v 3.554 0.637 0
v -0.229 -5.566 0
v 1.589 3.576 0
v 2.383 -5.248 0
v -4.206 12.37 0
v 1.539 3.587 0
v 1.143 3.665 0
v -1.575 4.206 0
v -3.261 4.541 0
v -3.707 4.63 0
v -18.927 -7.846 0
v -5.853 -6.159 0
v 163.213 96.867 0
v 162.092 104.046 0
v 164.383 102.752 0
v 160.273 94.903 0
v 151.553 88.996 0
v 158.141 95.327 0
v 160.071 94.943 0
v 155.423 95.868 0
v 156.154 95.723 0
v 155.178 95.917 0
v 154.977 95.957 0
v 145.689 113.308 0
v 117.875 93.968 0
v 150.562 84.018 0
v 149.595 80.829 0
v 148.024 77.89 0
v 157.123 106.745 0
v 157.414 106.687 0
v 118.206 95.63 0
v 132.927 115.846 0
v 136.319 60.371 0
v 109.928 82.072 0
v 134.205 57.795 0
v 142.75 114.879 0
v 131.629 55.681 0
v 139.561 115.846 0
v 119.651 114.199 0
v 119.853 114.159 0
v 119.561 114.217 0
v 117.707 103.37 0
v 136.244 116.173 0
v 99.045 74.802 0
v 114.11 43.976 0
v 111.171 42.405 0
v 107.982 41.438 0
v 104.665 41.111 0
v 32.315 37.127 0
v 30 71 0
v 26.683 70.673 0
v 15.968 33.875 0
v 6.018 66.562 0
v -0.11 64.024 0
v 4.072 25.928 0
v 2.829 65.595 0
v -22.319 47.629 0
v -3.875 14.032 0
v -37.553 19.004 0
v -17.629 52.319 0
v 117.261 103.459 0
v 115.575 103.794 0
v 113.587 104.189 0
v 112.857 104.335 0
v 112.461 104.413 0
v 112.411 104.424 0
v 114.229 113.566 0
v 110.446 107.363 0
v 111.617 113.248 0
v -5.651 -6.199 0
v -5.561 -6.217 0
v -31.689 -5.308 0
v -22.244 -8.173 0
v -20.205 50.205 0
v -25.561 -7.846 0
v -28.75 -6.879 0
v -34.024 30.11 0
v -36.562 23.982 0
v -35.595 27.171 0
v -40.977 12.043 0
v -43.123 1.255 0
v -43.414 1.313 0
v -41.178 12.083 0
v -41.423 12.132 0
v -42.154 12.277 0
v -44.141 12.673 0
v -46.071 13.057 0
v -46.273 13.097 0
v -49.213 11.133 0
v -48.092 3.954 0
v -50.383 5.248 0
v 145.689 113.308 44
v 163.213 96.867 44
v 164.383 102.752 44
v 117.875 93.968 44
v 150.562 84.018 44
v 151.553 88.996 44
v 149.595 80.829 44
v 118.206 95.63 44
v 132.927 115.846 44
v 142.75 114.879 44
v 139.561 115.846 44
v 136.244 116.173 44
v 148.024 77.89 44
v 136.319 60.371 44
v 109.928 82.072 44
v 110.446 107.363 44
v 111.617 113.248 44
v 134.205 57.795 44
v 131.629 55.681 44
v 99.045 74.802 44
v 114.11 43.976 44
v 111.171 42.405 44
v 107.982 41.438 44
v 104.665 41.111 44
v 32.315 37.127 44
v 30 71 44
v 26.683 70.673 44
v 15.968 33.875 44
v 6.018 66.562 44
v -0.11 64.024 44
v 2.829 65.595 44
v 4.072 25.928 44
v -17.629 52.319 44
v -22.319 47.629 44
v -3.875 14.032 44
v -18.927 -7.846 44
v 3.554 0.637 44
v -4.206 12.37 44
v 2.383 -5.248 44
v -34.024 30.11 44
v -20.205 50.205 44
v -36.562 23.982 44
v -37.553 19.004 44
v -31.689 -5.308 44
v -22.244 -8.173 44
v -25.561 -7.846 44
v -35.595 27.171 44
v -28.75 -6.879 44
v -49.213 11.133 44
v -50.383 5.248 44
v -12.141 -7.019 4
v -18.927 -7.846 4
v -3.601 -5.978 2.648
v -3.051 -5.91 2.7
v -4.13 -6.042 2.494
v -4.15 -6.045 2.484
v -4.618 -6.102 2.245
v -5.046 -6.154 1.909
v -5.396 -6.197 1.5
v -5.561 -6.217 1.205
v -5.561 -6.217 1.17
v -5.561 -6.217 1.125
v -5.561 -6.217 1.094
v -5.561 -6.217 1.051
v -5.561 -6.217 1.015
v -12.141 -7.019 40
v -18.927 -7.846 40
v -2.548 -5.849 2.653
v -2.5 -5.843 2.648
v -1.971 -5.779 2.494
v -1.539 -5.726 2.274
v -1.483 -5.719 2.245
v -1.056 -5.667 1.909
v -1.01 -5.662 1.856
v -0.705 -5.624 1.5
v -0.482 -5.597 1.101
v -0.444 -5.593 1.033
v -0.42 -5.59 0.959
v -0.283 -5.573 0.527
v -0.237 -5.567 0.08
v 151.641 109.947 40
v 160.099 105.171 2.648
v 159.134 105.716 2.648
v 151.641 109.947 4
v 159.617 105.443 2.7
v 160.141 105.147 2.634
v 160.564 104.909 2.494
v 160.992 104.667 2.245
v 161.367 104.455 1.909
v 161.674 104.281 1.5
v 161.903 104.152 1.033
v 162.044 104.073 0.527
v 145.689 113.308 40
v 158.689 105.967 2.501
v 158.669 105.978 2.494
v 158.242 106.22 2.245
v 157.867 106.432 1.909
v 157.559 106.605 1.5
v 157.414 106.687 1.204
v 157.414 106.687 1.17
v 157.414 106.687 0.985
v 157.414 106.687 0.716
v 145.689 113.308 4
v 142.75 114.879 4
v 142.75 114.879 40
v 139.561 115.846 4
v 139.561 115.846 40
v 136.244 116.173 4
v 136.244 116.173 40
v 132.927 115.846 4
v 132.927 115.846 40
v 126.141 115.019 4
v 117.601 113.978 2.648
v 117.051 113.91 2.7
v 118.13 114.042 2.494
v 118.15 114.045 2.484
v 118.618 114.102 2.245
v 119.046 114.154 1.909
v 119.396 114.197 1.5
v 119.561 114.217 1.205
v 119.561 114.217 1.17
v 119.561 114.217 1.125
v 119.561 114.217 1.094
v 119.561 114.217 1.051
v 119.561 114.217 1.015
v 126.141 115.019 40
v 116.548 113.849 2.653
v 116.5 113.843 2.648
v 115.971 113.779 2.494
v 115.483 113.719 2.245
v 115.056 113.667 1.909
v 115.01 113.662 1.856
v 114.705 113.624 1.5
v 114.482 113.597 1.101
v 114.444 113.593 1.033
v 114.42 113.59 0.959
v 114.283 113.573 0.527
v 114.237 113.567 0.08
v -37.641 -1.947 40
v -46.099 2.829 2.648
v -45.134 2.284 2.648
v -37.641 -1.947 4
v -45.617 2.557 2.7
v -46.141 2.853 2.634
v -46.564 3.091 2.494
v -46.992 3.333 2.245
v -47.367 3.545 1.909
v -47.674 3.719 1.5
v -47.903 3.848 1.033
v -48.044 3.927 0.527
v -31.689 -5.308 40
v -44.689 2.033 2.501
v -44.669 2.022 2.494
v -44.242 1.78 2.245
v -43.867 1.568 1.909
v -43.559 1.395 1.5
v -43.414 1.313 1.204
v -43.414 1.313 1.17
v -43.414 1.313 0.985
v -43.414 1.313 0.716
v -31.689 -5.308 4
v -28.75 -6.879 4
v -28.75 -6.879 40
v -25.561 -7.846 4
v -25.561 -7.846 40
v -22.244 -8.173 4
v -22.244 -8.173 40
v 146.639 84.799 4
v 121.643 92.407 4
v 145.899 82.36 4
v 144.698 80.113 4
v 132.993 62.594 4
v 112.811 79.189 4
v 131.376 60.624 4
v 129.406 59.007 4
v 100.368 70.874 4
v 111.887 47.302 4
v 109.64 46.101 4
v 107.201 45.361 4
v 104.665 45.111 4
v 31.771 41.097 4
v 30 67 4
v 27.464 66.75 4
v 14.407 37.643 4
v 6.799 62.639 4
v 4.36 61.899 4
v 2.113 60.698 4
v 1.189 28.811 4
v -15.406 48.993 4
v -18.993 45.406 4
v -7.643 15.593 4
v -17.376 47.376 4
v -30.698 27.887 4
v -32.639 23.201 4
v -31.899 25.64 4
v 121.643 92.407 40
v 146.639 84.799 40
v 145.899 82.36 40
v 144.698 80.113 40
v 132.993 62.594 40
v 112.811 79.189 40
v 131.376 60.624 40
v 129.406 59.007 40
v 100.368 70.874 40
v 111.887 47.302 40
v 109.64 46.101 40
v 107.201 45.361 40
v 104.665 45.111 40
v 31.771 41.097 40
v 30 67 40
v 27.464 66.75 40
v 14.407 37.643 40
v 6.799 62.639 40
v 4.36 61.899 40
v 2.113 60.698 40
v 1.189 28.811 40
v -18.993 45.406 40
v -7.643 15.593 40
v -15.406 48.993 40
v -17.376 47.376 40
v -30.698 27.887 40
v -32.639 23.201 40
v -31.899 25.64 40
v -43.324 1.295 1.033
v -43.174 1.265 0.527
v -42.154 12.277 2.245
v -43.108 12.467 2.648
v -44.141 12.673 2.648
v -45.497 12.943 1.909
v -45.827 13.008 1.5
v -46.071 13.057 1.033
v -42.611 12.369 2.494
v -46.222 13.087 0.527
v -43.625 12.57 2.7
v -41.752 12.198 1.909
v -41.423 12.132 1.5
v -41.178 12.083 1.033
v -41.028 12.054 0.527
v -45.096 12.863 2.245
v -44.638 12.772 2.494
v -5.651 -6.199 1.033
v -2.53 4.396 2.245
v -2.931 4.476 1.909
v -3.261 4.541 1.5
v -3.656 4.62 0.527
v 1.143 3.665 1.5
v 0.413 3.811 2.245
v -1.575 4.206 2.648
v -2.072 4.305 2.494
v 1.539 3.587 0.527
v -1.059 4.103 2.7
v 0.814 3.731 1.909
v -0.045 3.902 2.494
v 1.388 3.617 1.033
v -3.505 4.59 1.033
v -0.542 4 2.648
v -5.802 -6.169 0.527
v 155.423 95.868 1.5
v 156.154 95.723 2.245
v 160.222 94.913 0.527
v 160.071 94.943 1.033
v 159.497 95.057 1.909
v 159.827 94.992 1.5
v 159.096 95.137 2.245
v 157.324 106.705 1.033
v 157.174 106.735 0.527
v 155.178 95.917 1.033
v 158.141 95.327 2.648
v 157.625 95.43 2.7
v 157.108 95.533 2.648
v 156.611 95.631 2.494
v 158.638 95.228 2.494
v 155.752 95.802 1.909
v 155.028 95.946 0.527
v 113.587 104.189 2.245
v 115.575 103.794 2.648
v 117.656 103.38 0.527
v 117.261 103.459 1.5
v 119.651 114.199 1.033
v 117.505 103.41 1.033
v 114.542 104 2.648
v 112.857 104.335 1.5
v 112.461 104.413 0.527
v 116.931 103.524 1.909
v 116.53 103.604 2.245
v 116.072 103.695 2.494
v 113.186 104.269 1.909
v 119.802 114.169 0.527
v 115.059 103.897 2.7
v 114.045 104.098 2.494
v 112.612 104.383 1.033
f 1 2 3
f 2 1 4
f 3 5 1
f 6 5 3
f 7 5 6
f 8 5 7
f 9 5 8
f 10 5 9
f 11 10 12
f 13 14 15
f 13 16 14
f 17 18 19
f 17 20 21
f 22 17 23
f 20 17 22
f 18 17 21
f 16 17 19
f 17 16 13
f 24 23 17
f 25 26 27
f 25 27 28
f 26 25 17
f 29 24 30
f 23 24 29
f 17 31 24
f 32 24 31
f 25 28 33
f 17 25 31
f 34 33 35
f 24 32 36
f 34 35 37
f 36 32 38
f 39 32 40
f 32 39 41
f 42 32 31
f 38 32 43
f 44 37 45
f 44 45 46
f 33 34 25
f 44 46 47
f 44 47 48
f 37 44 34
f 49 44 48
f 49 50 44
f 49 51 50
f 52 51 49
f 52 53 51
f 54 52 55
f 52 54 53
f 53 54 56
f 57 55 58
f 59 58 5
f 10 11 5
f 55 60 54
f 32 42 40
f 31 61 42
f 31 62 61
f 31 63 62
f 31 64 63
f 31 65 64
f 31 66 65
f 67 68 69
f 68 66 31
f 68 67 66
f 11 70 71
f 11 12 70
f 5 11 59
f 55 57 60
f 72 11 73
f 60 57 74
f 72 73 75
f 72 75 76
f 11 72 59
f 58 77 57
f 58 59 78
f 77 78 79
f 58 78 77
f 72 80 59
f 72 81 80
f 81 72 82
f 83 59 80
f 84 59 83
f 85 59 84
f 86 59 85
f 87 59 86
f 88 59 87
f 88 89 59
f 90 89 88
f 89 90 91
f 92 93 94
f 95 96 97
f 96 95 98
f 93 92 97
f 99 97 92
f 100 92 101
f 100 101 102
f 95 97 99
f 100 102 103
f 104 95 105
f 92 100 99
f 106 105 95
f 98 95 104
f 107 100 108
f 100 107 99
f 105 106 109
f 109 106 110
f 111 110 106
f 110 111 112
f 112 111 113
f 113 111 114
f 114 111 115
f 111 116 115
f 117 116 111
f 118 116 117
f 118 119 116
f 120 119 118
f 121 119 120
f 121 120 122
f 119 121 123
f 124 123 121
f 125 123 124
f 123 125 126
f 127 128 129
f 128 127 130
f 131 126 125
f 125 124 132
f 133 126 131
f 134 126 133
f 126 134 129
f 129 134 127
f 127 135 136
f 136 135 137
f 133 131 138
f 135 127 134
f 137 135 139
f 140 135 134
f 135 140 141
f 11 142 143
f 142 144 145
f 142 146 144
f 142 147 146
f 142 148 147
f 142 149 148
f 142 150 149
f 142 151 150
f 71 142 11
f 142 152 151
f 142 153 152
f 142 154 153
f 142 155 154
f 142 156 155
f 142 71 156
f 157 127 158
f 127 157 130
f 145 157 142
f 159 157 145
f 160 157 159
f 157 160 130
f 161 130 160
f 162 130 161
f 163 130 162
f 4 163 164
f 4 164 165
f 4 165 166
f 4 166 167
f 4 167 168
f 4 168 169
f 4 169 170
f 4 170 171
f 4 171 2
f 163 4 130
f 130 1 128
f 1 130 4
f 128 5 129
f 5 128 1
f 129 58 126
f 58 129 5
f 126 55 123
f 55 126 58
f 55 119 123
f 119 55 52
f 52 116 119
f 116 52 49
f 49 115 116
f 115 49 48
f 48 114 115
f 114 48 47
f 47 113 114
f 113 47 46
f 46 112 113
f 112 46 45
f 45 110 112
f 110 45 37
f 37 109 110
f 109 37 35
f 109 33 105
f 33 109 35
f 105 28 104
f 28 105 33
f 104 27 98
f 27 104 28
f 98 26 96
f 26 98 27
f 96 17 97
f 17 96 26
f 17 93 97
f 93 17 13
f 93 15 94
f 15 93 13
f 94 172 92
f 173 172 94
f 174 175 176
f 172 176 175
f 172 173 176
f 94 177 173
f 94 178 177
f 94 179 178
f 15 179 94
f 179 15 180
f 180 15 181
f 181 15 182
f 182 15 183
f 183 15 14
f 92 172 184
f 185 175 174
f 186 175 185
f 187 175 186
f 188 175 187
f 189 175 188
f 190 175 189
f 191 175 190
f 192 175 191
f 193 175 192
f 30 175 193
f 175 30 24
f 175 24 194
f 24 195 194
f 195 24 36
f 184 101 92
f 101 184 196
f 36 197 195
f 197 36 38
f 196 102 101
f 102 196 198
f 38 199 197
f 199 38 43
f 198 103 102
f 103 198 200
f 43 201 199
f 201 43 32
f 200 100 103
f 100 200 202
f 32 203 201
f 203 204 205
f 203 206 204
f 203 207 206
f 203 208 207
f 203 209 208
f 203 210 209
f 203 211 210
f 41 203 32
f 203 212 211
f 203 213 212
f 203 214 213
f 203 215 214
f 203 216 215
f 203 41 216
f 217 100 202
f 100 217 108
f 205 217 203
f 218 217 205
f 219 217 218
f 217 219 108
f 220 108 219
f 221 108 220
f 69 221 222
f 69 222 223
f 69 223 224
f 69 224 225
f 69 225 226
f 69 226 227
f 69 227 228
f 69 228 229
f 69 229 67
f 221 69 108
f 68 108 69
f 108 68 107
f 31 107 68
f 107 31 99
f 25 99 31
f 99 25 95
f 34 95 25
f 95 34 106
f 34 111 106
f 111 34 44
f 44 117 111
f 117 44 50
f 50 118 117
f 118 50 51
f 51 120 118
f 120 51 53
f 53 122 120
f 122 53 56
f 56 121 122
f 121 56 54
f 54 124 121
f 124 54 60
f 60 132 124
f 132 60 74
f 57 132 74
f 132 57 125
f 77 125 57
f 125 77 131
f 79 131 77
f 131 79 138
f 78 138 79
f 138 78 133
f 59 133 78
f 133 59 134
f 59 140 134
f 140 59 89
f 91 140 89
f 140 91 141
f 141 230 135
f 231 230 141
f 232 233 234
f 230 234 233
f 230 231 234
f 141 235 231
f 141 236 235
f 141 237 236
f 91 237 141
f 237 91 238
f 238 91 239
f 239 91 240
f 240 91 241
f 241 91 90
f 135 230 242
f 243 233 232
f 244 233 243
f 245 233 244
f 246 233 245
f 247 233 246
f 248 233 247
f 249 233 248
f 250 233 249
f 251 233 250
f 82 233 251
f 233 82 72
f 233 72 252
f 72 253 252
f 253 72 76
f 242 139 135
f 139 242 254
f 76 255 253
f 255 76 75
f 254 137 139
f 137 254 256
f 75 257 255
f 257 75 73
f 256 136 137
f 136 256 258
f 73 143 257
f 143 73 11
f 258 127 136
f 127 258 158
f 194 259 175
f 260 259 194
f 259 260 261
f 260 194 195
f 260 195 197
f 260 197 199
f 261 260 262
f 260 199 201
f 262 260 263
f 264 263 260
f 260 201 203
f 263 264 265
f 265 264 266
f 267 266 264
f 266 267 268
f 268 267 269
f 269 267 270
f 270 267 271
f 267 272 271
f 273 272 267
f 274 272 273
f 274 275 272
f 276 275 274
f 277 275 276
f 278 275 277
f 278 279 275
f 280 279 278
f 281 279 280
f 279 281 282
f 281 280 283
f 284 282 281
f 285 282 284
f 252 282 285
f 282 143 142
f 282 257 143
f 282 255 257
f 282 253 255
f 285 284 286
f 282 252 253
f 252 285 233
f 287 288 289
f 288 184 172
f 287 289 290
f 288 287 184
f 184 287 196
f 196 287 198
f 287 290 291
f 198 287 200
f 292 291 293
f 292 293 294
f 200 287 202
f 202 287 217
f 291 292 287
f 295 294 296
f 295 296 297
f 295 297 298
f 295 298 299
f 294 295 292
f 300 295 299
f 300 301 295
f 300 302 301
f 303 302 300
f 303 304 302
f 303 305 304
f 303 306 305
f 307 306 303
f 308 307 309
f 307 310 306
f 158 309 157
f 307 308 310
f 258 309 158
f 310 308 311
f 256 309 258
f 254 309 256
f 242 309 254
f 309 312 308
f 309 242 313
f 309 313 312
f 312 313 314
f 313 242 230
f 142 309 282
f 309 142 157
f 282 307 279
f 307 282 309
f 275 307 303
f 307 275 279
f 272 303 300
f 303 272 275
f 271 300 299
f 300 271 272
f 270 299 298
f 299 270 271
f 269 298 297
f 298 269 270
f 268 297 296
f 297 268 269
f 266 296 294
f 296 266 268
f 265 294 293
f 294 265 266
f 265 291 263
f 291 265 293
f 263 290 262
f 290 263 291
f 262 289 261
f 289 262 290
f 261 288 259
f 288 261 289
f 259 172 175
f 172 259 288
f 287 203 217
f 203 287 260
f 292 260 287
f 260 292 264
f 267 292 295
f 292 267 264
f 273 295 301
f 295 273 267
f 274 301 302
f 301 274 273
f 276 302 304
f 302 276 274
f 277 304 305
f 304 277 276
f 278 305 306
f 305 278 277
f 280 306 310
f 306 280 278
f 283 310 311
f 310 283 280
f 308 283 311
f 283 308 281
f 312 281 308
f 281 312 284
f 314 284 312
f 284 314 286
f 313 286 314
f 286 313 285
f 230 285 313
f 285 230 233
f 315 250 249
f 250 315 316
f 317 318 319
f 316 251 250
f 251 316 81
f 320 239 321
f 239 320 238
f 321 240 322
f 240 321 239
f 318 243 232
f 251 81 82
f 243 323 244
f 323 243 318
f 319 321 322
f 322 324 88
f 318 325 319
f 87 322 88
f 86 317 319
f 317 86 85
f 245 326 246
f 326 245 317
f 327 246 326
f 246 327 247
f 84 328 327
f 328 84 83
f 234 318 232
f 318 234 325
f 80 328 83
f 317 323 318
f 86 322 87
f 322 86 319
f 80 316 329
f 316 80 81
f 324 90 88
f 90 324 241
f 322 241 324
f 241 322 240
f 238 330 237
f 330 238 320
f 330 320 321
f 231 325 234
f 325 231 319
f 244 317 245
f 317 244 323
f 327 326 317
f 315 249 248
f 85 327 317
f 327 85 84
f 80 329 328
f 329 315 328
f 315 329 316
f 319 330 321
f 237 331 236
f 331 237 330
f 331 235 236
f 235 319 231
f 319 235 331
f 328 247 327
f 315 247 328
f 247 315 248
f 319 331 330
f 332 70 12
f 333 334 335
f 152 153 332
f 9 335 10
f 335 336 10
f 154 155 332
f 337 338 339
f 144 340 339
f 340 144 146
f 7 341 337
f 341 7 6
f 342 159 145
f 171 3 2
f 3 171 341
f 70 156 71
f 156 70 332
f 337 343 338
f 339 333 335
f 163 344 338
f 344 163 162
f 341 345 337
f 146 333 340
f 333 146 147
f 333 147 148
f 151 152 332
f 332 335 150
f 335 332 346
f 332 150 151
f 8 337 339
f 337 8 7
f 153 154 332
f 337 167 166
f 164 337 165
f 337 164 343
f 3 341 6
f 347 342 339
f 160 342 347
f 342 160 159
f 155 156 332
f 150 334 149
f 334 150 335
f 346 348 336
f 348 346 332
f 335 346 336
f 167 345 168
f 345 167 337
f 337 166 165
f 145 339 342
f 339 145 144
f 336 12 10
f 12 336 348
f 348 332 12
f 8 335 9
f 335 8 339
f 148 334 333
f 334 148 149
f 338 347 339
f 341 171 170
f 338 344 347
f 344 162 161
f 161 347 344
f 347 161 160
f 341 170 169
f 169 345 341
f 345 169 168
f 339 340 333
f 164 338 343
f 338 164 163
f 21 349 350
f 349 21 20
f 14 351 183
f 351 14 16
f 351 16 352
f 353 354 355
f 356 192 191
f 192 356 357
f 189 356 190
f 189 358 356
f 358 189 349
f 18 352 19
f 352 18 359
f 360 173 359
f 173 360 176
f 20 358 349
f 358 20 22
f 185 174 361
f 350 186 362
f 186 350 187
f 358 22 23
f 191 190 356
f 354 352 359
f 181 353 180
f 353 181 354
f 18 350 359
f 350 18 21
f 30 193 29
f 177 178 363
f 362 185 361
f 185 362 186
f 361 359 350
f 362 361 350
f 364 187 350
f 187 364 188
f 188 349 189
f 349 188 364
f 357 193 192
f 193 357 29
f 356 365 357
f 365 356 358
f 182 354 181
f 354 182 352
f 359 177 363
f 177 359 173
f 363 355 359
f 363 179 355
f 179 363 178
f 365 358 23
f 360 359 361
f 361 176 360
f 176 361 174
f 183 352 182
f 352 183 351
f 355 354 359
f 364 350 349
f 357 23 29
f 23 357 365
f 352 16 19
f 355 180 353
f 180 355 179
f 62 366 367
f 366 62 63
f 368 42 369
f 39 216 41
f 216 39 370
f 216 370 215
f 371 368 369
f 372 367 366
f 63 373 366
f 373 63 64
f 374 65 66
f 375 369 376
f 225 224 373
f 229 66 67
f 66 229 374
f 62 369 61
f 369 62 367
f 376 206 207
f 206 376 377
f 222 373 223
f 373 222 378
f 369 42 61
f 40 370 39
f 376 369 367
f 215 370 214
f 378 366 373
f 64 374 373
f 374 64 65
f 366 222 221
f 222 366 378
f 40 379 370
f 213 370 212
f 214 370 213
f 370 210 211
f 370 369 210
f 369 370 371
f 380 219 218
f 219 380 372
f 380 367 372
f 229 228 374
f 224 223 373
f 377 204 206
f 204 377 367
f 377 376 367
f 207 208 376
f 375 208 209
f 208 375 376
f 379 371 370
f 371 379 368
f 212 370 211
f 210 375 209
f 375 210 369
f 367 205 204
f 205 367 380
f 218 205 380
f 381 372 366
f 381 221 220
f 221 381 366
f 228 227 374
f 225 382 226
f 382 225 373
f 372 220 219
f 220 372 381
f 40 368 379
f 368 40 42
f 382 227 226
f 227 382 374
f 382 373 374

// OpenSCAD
$fn = 32;

// ----------------------------------------------------------------------
// Air duct: 34 mm duct, 4 mm wall, 44 mm across
// ----------------------------------------------------------------------

// --- parameters (mm) ---
duct_r = 17;              // duct core radius
duct_d = 34;              // duct core diameter
wall = 4;                 // duct wall thickness
height = 44;              // duct width (extrusion height)
port_r = 26.9;            // port flange half width
port_d = 53.8;            // port flange width
port_t = 6;               // port flange thickness
bolt_d = 5.4;             // port bolt holes
bolt_offset = 21.7;       // bolt hole offset from the port axis

difference() {
  /* outer hull chain: tube with a flat flange plate at every port */
  linear_extrude(height = 44) {
    hull() {
      polygon([[2.383, -5.248], [-50.383, 5.248], [-49.213, 11.133], [3.554, 0.637]]);
      translate([-22.244, 8.827]) circle(r = 17);
    }
    hull() {
      translate([-22.244, 8.827]) circle(r = 17);
      translate([-19.889, 20.665]) circle(r = 17);
    }
    hull() {
      translate([-19.889, 20.665]) circle(r = 17);
      translate([-8.184, 38.184]) circle(r = 17);
    }
    hull() {
      translate([-8.184, 38.184]) circle(r = 17);
      translate([9.335, 49.889]) circle(r = 17);
    }
    hull() {
      translate([9.335, 49.889]) circle(r = 17);
      translate([30, 54]) circle(r = 17);
    }
    hull() {
      translate([30, 54]) circle(r = 17);
      translate([104.665, 58.111]) circle(r = 17);
    }
    hull() {
      translate([104.665, 58.111]) circle(r = 17);
      translate([122.184, 69.816]) circle(r = 17);
    }
    hull() {
      translate([122.184, 69.816]) circle(r = 17);
      translate([133.889, 87.335]) circle(r = 17);
    }
    hull() {
      translate([133.889, 87.335]) circle(r = 17);
      translate([136.244, 99.173]) circle(r = 17);
    }
    hull() {
      translate([136.244, 99.173]) circle(r = 17);
      polygon([[111.617, 113.248], [164.383, 102.752], [163.213, 96.867], [110.446, 107.363]]);
    }
  }
  /* air passage: the same chain inset by the wall, 5 mm proud of the ports */
  translate([0, 0, 4]) linear_extrude(height = 36) {
    hull() {
      translate([-24.975, -4.904]) circle(r = 13);
      translate([-19.889, 20.665]) circle(r = 13);
    }
    hull() {
      translate([-19.889, 20.665]) circle(r = 13);
      translate([-8.184, 38.184]) circle(r = 13);
    }
    hull() {
      translate([-8.184, 38.184]) circle(r = 13);
      translate([9.335, 49.889]) circle(r = 13);
    }
    hull() {
      translate([9.335, 49.889]) circle(r = 13);
      translate([30, 54]) circle(r = 13);
    }
    hull() {
      translate([30, 54]) circle(r = 13);
      translate([104.665, 58.111]) circle(r = 13);
    }
    hull() {
      translate([104.665, 58.111]) circle(r = 13);
      translate([122.184, 69.816]) circle(r = 13);
    }
    hull() {
      translate([122.184, 69.816]) circle(r = 13);
      translate([133.889, 87.335]) circle(r = 13);
    }
    hull() {
      translate([133.889, 87.335]) circle(r = 13);
      translate([138.975, 112.904]) circle(r = 13);
    }
  }
  translate([-24, 0]) rotate([0, 0, -11.25]) translate([-21.7, -2.5]) rotate([-90, 0, 0]) cylinder(h = 11, d = 5.4);
  translate([-24, 0]) rotate([0, 0, -11.25]) translate([21.7, -2.5]) rotate([-90, 0, 0]) cylinder(h = 11, d = 5.4);
  translate([138, 108]) rotate([0, 0, 168.75]) translate([-21.7, -2.5]) rotate([-90, 0, 0]) cylinder(h = 11, d = 5.4);
  translate([138, 108]) rotate([0, 0, 168.75]) translate([21.7, -2.5]) rotate([-90, 0, 0]) cylinder(h = 11, d = 5.4);
}
